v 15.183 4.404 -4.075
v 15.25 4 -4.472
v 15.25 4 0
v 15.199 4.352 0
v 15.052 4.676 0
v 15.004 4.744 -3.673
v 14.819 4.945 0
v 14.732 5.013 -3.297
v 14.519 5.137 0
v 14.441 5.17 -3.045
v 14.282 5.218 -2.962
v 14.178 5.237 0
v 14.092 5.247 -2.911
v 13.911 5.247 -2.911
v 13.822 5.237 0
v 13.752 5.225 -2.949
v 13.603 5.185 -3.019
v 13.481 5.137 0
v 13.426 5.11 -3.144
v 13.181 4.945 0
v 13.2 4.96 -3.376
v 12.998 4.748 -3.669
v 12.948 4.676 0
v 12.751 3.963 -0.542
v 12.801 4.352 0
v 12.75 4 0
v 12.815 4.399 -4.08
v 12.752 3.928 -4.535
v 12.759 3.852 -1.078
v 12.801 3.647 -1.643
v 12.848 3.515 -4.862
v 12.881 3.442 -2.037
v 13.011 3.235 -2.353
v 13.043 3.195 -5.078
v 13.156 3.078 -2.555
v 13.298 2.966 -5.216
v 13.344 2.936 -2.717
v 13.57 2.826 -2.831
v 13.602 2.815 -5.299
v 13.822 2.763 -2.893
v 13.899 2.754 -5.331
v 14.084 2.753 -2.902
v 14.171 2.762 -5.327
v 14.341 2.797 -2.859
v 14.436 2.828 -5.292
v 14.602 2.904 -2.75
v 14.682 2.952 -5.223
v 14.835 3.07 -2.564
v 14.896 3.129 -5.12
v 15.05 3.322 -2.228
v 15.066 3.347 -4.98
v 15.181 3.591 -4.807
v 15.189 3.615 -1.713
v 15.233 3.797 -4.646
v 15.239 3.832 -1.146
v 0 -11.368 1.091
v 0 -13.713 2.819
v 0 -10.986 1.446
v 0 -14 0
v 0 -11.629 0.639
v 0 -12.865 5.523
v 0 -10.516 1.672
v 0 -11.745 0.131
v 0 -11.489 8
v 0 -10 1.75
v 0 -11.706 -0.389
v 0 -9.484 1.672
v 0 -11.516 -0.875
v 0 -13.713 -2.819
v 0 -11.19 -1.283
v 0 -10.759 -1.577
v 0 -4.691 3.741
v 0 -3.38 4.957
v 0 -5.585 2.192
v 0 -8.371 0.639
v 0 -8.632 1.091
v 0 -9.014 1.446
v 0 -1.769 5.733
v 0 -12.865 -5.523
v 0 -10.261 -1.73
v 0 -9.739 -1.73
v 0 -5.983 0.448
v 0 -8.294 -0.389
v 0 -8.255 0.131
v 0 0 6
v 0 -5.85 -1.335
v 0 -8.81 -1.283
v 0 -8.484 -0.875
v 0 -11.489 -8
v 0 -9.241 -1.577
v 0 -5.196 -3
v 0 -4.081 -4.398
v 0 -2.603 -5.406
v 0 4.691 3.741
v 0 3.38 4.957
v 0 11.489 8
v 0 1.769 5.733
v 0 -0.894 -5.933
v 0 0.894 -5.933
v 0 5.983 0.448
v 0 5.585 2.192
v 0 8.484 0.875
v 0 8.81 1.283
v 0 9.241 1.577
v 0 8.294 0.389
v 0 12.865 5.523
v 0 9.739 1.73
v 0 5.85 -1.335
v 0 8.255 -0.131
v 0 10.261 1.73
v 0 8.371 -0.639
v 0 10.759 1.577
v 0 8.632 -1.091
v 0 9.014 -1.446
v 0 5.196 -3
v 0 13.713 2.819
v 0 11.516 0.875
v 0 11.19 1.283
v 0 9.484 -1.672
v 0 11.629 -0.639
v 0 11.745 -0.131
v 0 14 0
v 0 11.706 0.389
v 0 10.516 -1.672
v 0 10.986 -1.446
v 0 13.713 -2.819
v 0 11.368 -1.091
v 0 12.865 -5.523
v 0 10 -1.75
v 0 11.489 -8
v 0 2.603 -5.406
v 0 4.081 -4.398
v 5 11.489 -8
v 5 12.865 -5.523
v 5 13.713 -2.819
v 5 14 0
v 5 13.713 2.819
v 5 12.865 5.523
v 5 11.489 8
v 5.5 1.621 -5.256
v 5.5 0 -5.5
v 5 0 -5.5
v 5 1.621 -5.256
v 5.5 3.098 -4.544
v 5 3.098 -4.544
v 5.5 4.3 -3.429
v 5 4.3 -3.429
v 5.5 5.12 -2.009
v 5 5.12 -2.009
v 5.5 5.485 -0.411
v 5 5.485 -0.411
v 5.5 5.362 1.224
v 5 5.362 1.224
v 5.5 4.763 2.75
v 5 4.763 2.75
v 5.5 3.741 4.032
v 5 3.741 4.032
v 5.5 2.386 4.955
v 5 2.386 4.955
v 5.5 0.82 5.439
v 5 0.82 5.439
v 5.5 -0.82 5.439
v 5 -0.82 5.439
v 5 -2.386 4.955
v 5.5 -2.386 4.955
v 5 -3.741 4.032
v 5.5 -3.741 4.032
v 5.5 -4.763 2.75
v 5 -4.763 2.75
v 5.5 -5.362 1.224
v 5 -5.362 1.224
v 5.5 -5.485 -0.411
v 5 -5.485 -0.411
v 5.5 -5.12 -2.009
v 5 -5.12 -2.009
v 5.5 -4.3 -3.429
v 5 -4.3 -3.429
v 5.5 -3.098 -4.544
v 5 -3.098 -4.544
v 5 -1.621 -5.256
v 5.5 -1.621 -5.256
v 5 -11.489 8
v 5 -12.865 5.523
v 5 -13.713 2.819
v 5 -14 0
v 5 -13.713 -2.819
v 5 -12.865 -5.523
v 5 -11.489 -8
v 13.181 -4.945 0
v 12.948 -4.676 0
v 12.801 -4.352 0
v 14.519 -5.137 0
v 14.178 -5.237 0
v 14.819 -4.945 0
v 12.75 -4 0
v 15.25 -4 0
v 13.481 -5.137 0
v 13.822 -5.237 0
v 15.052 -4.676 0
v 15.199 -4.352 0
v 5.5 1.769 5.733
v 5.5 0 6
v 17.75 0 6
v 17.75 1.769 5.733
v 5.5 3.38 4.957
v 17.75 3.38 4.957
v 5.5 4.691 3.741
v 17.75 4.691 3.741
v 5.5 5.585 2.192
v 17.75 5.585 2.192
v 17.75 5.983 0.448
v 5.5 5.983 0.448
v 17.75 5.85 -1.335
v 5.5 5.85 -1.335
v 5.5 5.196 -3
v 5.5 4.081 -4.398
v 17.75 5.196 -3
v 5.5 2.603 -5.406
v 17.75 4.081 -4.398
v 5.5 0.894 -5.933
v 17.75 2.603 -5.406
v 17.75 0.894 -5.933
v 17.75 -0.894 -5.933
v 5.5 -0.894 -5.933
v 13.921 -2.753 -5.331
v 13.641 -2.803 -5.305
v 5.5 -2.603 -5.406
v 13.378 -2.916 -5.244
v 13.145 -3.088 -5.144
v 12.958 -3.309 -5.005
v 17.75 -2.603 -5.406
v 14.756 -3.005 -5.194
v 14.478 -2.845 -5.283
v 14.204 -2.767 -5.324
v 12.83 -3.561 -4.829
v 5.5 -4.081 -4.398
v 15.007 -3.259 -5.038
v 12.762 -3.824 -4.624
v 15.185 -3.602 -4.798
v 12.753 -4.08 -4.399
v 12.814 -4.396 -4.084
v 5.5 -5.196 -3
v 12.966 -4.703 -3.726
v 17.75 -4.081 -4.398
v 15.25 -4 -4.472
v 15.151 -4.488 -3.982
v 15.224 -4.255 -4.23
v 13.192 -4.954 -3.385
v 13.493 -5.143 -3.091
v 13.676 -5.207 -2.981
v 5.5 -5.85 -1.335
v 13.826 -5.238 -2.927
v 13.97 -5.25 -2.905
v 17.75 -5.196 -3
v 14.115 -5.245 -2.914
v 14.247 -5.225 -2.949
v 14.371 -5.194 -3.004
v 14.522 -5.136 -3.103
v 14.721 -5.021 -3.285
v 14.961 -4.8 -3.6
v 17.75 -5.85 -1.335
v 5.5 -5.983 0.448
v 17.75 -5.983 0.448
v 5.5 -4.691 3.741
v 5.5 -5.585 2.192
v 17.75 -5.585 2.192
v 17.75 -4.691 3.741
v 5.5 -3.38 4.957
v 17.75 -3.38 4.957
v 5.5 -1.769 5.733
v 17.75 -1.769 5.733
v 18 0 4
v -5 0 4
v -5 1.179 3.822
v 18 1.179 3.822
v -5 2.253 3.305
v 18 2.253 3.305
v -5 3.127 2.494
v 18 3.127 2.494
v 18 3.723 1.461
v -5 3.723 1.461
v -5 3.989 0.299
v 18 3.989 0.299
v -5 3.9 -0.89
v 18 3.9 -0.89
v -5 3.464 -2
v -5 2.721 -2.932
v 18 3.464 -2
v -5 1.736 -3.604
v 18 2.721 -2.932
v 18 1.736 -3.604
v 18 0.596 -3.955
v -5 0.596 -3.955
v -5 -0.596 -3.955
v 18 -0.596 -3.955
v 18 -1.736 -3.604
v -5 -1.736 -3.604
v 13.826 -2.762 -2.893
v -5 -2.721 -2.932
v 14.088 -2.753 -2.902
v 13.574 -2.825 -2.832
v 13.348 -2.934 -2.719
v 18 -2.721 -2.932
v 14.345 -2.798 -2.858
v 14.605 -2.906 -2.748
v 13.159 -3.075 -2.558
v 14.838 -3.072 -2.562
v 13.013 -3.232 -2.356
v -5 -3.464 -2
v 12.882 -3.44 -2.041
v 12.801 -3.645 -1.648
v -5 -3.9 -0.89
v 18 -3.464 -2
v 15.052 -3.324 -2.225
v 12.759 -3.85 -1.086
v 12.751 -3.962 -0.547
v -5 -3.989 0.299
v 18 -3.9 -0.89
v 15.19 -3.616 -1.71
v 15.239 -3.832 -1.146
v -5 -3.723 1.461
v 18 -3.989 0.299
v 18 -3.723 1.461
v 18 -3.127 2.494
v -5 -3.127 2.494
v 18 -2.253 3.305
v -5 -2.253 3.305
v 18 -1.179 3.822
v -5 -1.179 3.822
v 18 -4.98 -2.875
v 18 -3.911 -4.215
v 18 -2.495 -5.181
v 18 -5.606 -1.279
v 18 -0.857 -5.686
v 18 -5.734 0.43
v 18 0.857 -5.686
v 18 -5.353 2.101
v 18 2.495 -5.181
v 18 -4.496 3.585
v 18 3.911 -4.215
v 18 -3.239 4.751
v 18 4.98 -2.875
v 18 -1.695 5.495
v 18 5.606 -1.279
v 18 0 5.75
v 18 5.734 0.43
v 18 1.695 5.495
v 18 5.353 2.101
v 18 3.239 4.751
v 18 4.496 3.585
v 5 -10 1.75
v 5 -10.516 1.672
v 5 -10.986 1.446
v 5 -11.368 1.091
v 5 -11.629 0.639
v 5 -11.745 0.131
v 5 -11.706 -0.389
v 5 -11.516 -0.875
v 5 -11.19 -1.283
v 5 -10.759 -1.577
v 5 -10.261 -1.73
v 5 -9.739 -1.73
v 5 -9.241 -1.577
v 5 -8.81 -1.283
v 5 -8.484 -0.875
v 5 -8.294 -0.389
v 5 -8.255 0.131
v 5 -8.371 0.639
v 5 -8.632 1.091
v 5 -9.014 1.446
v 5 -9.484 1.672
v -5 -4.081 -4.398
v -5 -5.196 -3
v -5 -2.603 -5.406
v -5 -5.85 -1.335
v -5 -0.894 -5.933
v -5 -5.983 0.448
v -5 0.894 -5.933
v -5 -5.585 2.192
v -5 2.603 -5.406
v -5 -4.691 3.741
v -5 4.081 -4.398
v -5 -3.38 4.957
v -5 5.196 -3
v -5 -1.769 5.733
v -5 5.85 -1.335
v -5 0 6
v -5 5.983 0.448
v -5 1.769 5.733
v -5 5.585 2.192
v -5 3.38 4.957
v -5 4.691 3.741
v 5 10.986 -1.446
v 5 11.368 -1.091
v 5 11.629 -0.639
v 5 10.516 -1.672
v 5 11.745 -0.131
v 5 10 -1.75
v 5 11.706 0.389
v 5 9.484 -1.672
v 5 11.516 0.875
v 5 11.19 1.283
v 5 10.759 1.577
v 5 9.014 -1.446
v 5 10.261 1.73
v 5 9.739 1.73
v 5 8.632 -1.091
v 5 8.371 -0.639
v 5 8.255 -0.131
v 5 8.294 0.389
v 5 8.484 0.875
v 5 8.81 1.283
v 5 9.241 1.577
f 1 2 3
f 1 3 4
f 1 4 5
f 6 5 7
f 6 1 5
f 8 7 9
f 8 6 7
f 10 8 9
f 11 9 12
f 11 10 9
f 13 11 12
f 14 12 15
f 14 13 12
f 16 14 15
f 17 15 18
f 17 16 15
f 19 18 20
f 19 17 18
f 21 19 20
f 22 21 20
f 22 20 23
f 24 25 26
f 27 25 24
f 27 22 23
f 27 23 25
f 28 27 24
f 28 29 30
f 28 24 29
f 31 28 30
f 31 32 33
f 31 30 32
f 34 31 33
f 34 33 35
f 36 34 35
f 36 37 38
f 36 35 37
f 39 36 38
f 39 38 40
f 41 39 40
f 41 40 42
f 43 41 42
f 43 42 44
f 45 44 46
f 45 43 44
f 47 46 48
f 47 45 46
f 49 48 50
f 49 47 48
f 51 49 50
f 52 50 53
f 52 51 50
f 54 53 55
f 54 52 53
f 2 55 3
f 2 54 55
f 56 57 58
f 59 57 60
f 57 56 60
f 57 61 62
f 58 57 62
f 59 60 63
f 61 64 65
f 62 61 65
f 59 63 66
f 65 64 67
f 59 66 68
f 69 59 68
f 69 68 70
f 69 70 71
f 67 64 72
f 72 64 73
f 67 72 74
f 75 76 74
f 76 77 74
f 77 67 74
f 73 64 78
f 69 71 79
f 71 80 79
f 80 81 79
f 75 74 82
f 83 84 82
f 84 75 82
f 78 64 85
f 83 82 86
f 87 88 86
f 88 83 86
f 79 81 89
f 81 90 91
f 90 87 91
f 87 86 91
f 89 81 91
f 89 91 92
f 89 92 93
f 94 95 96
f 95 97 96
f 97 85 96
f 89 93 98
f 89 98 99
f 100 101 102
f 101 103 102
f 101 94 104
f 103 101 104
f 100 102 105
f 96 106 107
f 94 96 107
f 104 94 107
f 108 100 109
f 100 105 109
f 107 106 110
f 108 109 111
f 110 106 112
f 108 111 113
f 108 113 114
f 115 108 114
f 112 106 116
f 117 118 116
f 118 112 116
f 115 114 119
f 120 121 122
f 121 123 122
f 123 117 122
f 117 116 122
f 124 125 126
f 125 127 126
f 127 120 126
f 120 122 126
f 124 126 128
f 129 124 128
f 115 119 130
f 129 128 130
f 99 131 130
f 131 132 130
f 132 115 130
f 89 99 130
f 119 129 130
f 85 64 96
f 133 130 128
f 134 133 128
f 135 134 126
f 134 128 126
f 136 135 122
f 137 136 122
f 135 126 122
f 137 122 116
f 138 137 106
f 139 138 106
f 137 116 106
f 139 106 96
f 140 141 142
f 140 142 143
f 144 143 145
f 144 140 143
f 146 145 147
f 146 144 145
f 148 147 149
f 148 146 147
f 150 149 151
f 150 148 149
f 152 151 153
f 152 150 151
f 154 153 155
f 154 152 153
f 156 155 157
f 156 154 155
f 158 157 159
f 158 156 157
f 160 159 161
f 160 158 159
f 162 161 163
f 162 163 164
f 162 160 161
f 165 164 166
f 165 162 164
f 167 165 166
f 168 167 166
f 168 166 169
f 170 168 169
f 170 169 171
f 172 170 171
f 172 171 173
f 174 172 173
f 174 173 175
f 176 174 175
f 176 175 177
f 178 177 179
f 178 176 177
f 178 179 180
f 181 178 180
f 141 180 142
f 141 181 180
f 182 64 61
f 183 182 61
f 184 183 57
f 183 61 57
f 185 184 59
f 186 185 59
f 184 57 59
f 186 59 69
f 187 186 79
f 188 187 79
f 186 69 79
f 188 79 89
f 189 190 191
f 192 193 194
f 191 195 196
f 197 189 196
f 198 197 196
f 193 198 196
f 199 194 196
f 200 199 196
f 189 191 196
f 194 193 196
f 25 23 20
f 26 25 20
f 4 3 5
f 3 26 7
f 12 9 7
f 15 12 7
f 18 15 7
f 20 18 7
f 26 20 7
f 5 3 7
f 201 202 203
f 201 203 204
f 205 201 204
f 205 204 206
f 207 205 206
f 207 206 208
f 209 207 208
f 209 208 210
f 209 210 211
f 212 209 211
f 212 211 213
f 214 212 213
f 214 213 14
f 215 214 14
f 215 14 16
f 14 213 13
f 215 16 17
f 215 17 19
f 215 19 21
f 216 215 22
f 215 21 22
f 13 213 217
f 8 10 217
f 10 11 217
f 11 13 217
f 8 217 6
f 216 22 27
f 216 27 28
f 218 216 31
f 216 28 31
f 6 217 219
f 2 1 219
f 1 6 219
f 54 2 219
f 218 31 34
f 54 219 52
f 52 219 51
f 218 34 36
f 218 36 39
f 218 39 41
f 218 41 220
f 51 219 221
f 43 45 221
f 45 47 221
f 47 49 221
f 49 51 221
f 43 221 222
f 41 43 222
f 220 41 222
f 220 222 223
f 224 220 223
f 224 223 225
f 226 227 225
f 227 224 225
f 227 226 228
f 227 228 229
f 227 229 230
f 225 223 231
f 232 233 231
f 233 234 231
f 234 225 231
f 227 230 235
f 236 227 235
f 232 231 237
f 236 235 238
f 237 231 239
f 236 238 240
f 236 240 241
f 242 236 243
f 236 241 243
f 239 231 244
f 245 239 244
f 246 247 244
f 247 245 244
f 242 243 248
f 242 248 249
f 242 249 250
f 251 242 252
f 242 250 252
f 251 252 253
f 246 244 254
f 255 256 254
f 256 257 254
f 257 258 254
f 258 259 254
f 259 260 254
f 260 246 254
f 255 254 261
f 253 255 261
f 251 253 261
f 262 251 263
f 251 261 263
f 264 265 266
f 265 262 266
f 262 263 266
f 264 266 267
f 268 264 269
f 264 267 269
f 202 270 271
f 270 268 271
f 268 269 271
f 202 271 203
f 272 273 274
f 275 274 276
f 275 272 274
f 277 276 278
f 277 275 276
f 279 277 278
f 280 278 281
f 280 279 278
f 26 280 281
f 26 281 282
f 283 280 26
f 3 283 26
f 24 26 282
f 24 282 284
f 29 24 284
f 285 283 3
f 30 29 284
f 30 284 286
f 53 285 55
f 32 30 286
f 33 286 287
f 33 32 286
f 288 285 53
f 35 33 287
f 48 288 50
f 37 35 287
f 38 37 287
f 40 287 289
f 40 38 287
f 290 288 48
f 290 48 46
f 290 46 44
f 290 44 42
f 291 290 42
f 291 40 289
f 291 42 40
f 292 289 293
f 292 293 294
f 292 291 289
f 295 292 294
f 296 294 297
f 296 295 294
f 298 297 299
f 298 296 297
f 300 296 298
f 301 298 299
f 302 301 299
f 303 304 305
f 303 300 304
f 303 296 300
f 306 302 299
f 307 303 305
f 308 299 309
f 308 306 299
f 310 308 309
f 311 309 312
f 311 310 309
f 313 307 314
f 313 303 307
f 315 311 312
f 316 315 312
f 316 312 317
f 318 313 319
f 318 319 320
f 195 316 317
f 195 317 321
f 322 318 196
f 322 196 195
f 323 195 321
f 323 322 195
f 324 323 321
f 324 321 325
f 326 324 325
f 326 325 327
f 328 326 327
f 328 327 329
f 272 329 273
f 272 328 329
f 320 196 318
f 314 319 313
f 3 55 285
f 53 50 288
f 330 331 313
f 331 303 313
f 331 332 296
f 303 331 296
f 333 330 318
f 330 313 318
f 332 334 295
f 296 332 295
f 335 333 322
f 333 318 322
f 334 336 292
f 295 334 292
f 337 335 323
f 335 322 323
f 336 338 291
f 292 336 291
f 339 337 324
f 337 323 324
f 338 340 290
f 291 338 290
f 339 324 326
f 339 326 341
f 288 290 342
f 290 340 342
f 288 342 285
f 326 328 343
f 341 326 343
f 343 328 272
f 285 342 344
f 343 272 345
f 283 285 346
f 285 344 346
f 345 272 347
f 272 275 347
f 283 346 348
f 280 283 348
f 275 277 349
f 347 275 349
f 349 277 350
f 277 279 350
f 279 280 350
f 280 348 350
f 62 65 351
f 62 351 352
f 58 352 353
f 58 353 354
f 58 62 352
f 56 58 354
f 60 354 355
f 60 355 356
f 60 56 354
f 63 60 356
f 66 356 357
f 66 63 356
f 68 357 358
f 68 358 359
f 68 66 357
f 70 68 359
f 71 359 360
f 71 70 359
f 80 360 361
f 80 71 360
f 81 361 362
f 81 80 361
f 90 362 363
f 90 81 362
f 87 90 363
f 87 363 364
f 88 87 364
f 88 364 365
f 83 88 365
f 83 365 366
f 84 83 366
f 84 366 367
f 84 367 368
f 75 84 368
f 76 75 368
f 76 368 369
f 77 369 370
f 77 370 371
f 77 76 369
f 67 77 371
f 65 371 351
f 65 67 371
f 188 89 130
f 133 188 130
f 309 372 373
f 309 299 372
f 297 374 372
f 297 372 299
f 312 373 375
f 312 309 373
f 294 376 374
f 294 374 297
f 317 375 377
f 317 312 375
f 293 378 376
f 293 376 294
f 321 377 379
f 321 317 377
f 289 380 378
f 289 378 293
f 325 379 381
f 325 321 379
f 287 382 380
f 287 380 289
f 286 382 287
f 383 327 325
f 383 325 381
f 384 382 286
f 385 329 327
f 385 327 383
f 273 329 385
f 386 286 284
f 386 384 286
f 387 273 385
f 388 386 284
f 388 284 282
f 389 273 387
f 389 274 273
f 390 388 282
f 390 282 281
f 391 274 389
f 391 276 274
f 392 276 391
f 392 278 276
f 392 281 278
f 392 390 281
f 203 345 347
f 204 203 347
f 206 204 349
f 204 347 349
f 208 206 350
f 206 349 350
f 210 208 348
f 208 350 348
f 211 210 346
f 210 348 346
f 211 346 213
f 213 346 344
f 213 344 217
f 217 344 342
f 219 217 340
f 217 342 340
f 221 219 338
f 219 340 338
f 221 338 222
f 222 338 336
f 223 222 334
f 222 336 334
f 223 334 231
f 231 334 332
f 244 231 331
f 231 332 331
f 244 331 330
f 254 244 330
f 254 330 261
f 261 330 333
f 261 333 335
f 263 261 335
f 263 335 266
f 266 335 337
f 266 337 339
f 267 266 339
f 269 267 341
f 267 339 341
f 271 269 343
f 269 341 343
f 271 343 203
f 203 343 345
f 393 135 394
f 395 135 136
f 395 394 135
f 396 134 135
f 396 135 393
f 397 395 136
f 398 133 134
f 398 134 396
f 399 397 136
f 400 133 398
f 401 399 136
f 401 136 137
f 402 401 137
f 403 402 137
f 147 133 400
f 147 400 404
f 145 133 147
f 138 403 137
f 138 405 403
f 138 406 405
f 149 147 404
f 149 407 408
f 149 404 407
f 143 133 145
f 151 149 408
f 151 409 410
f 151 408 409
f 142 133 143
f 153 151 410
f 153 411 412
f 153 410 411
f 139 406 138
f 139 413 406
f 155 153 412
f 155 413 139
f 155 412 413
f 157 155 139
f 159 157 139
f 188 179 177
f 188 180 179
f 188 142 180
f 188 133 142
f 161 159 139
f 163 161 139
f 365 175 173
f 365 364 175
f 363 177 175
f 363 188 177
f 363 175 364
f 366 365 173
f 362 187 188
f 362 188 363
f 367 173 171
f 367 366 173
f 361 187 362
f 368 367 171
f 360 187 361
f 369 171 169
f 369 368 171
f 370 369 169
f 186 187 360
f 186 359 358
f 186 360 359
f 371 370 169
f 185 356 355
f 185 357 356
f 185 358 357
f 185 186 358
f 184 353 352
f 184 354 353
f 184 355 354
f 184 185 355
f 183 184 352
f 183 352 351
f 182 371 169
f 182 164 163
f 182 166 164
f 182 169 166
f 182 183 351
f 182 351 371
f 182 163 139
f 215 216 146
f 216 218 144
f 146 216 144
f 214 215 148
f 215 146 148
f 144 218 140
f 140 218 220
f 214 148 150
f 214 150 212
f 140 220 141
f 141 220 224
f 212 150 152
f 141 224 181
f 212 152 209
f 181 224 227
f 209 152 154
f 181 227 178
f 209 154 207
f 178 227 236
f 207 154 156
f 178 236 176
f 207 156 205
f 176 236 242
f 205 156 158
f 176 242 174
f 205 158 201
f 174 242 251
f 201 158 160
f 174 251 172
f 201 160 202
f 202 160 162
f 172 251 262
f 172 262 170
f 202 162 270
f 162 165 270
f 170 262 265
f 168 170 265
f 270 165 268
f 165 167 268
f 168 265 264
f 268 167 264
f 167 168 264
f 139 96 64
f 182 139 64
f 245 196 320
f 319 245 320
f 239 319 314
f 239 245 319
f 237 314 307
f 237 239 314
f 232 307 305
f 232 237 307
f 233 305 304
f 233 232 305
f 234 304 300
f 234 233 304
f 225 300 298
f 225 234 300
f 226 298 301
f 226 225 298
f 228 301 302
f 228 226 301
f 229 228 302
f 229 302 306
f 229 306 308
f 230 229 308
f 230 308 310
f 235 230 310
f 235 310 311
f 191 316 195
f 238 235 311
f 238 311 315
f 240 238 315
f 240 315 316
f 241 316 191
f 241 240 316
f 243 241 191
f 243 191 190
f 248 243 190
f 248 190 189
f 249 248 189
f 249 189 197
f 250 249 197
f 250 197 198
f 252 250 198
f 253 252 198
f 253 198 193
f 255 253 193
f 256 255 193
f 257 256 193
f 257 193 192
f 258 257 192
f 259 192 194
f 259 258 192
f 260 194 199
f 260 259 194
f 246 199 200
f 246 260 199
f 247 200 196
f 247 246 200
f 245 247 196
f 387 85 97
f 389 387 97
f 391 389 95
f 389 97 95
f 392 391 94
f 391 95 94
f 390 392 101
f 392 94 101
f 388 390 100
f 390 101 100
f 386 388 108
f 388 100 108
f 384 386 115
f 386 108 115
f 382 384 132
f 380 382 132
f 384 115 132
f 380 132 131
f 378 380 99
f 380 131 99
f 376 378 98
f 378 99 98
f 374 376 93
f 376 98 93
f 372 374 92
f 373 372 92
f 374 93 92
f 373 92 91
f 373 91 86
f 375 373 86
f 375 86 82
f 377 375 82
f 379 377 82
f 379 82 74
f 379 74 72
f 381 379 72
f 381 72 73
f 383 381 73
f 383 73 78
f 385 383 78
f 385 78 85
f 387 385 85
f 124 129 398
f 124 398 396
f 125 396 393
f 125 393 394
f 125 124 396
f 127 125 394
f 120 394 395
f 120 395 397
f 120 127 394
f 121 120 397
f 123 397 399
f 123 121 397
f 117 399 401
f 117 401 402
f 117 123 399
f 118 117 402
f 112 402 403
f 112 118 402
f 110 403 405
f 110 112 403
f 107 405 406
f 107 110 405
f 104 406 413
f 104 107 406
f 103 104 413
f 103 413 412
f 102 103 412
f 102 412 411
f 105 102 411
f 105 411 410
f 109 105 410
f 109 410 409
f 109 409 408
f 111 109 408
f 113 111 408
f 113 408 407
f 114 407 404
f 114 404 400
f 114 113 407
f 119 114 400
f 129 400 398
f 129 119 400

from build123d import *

# Parameters (mm, degrees)
SKETCH_2_R                 = 1.75
EXTRUDE_1_DEPTH            = 5
EXTRUDE_3_DEPTH            = 5
EXTRUDE_3_DEPTH_BACK       = 18
SKETCH_3_R                 = 6
SKETCH_3_R_2               = 4
CUT_EXTRUDE_2_DEPTH        = 25.166091947
CUT_EXTRUDE_2_DEPTH_BACK   = 25.166091947
SKETCH_7_R                 = 4
HOLE_START                 = -5.332682415
HOLE_WIZARD_M3_2_OUTLINE_R = 1.25
HOLE_WIZARD_M3_2_DEPTH     = 5.332682415
CHAMFER_2_SIZE             = 0.25
SKETCH_13_R                = 6
SKETCH_13_R_2              = 5.5
CUT_EXTRUDE_4_DEPTH        = 0.5


# Read off the part's stored shape, not the designer's step: M3 螺纹孔2
with BuildPart() as part:
    # 草图2 → 凸台-拉伸1 (new body)
    with BuildSketch(Plane(origin=(0, 0, 0), x_dir=(0, 0, -1), z_dir=(1, 0, 0))):
        with BuildLine():
            Line((-8, 11.489125293), (-8, -11.489125293))
            ThreePointArc((-8, -11.489125293), (0, -14), (8, -11.489125293))
            Line((8, -11.489125293), (8, 11.489125293))
            ThreePointArc((8, 11.489125293), (0, 14), (-8, 11.489125293))
        make_face()
        with Locations((0, 10)):
            Circle(SKETCH_2_R, mode=Mode.SUBTRACT)
        with Locations(Location((0, -10, 0), (0, 0, 180))):
            Circle(SKETCH_2_R, mode=Mode.SUBTRACT)
    extrude(amount=EXTRUDE_1_DEPTH)

    # 草图3 → 凸台-拉伸3 (add, two sides: drawn at the far end of the back side and taken through both)
    with BuildSketch(Plane.ZY.offset(-EXTRUDE_3_DEPTH_BACK)):
        Circle(SKETCH_3_R)
        Circle(SKETCH_3_R_2, mode=Mode.SUBTRACT)
    extrude(amount=EXTRUDE_3_DEPTH + EXTRUDE_3_DEPTH_BACK)

    # 草图7 → 切除-拉伸2 (cut, two sides: drawn at the far end of the back side and taken through both)
    with BuildSketch(Plane.ZY.offset(-CUT_EXTRUDE_2_DEPTH_BACK)):
        Circle(SKETCH_7_R)
    extrude(amount=CUT_EXTRUDE_2_DEPTH + CUT_EXTRUDE_2_DEPTH_BACK, mode=Mode.SUBTRACT)

    # M3 螺纹孔2 outline → M3 螺纹孔2 (cut)
    with BuildSketch(Plane.XY.offset(HOLE_START)):
        with Locations((14, -4)):
            Circle(HOLE_WIZARD_M3_2_OUTLINE_R)
        with Locations((14, 4)):
            Circle(HOLE_WIZARD_M3_2_OUTLINE_R)
    extrude(amount=HOLE_WIZARD_M3_2_DEPTH, mode=Mode.SUBTRACT)

    # 倒角2
    chamfer_2_edges = [part.edges().sort_by_distance(p)[0] for p in [
        (18, 0, -6),
    ]]
    chamfer(chamfer_2_edges, length=CHAMFER_2_SIZE)

    # 草图13 → 切除-拉伸4 (cut)
    with BuildSketch(Plane(origin=(5.5, 0, 0), x_dir=(0, 0, -1), z_dir=(1, 0, 0))):
        with Locations(Location((0, 0, 0), (0, 0, 180))):
            Circle(SKETCH_13_R)
        Circle(SKETCH_13_R_2, mode=Mode.SUBTRACT)
    extrude(amount=-CUT_EXTRUDE_4_DEPTH, mode=Mode.SUBTRACT)


solid = part.part
